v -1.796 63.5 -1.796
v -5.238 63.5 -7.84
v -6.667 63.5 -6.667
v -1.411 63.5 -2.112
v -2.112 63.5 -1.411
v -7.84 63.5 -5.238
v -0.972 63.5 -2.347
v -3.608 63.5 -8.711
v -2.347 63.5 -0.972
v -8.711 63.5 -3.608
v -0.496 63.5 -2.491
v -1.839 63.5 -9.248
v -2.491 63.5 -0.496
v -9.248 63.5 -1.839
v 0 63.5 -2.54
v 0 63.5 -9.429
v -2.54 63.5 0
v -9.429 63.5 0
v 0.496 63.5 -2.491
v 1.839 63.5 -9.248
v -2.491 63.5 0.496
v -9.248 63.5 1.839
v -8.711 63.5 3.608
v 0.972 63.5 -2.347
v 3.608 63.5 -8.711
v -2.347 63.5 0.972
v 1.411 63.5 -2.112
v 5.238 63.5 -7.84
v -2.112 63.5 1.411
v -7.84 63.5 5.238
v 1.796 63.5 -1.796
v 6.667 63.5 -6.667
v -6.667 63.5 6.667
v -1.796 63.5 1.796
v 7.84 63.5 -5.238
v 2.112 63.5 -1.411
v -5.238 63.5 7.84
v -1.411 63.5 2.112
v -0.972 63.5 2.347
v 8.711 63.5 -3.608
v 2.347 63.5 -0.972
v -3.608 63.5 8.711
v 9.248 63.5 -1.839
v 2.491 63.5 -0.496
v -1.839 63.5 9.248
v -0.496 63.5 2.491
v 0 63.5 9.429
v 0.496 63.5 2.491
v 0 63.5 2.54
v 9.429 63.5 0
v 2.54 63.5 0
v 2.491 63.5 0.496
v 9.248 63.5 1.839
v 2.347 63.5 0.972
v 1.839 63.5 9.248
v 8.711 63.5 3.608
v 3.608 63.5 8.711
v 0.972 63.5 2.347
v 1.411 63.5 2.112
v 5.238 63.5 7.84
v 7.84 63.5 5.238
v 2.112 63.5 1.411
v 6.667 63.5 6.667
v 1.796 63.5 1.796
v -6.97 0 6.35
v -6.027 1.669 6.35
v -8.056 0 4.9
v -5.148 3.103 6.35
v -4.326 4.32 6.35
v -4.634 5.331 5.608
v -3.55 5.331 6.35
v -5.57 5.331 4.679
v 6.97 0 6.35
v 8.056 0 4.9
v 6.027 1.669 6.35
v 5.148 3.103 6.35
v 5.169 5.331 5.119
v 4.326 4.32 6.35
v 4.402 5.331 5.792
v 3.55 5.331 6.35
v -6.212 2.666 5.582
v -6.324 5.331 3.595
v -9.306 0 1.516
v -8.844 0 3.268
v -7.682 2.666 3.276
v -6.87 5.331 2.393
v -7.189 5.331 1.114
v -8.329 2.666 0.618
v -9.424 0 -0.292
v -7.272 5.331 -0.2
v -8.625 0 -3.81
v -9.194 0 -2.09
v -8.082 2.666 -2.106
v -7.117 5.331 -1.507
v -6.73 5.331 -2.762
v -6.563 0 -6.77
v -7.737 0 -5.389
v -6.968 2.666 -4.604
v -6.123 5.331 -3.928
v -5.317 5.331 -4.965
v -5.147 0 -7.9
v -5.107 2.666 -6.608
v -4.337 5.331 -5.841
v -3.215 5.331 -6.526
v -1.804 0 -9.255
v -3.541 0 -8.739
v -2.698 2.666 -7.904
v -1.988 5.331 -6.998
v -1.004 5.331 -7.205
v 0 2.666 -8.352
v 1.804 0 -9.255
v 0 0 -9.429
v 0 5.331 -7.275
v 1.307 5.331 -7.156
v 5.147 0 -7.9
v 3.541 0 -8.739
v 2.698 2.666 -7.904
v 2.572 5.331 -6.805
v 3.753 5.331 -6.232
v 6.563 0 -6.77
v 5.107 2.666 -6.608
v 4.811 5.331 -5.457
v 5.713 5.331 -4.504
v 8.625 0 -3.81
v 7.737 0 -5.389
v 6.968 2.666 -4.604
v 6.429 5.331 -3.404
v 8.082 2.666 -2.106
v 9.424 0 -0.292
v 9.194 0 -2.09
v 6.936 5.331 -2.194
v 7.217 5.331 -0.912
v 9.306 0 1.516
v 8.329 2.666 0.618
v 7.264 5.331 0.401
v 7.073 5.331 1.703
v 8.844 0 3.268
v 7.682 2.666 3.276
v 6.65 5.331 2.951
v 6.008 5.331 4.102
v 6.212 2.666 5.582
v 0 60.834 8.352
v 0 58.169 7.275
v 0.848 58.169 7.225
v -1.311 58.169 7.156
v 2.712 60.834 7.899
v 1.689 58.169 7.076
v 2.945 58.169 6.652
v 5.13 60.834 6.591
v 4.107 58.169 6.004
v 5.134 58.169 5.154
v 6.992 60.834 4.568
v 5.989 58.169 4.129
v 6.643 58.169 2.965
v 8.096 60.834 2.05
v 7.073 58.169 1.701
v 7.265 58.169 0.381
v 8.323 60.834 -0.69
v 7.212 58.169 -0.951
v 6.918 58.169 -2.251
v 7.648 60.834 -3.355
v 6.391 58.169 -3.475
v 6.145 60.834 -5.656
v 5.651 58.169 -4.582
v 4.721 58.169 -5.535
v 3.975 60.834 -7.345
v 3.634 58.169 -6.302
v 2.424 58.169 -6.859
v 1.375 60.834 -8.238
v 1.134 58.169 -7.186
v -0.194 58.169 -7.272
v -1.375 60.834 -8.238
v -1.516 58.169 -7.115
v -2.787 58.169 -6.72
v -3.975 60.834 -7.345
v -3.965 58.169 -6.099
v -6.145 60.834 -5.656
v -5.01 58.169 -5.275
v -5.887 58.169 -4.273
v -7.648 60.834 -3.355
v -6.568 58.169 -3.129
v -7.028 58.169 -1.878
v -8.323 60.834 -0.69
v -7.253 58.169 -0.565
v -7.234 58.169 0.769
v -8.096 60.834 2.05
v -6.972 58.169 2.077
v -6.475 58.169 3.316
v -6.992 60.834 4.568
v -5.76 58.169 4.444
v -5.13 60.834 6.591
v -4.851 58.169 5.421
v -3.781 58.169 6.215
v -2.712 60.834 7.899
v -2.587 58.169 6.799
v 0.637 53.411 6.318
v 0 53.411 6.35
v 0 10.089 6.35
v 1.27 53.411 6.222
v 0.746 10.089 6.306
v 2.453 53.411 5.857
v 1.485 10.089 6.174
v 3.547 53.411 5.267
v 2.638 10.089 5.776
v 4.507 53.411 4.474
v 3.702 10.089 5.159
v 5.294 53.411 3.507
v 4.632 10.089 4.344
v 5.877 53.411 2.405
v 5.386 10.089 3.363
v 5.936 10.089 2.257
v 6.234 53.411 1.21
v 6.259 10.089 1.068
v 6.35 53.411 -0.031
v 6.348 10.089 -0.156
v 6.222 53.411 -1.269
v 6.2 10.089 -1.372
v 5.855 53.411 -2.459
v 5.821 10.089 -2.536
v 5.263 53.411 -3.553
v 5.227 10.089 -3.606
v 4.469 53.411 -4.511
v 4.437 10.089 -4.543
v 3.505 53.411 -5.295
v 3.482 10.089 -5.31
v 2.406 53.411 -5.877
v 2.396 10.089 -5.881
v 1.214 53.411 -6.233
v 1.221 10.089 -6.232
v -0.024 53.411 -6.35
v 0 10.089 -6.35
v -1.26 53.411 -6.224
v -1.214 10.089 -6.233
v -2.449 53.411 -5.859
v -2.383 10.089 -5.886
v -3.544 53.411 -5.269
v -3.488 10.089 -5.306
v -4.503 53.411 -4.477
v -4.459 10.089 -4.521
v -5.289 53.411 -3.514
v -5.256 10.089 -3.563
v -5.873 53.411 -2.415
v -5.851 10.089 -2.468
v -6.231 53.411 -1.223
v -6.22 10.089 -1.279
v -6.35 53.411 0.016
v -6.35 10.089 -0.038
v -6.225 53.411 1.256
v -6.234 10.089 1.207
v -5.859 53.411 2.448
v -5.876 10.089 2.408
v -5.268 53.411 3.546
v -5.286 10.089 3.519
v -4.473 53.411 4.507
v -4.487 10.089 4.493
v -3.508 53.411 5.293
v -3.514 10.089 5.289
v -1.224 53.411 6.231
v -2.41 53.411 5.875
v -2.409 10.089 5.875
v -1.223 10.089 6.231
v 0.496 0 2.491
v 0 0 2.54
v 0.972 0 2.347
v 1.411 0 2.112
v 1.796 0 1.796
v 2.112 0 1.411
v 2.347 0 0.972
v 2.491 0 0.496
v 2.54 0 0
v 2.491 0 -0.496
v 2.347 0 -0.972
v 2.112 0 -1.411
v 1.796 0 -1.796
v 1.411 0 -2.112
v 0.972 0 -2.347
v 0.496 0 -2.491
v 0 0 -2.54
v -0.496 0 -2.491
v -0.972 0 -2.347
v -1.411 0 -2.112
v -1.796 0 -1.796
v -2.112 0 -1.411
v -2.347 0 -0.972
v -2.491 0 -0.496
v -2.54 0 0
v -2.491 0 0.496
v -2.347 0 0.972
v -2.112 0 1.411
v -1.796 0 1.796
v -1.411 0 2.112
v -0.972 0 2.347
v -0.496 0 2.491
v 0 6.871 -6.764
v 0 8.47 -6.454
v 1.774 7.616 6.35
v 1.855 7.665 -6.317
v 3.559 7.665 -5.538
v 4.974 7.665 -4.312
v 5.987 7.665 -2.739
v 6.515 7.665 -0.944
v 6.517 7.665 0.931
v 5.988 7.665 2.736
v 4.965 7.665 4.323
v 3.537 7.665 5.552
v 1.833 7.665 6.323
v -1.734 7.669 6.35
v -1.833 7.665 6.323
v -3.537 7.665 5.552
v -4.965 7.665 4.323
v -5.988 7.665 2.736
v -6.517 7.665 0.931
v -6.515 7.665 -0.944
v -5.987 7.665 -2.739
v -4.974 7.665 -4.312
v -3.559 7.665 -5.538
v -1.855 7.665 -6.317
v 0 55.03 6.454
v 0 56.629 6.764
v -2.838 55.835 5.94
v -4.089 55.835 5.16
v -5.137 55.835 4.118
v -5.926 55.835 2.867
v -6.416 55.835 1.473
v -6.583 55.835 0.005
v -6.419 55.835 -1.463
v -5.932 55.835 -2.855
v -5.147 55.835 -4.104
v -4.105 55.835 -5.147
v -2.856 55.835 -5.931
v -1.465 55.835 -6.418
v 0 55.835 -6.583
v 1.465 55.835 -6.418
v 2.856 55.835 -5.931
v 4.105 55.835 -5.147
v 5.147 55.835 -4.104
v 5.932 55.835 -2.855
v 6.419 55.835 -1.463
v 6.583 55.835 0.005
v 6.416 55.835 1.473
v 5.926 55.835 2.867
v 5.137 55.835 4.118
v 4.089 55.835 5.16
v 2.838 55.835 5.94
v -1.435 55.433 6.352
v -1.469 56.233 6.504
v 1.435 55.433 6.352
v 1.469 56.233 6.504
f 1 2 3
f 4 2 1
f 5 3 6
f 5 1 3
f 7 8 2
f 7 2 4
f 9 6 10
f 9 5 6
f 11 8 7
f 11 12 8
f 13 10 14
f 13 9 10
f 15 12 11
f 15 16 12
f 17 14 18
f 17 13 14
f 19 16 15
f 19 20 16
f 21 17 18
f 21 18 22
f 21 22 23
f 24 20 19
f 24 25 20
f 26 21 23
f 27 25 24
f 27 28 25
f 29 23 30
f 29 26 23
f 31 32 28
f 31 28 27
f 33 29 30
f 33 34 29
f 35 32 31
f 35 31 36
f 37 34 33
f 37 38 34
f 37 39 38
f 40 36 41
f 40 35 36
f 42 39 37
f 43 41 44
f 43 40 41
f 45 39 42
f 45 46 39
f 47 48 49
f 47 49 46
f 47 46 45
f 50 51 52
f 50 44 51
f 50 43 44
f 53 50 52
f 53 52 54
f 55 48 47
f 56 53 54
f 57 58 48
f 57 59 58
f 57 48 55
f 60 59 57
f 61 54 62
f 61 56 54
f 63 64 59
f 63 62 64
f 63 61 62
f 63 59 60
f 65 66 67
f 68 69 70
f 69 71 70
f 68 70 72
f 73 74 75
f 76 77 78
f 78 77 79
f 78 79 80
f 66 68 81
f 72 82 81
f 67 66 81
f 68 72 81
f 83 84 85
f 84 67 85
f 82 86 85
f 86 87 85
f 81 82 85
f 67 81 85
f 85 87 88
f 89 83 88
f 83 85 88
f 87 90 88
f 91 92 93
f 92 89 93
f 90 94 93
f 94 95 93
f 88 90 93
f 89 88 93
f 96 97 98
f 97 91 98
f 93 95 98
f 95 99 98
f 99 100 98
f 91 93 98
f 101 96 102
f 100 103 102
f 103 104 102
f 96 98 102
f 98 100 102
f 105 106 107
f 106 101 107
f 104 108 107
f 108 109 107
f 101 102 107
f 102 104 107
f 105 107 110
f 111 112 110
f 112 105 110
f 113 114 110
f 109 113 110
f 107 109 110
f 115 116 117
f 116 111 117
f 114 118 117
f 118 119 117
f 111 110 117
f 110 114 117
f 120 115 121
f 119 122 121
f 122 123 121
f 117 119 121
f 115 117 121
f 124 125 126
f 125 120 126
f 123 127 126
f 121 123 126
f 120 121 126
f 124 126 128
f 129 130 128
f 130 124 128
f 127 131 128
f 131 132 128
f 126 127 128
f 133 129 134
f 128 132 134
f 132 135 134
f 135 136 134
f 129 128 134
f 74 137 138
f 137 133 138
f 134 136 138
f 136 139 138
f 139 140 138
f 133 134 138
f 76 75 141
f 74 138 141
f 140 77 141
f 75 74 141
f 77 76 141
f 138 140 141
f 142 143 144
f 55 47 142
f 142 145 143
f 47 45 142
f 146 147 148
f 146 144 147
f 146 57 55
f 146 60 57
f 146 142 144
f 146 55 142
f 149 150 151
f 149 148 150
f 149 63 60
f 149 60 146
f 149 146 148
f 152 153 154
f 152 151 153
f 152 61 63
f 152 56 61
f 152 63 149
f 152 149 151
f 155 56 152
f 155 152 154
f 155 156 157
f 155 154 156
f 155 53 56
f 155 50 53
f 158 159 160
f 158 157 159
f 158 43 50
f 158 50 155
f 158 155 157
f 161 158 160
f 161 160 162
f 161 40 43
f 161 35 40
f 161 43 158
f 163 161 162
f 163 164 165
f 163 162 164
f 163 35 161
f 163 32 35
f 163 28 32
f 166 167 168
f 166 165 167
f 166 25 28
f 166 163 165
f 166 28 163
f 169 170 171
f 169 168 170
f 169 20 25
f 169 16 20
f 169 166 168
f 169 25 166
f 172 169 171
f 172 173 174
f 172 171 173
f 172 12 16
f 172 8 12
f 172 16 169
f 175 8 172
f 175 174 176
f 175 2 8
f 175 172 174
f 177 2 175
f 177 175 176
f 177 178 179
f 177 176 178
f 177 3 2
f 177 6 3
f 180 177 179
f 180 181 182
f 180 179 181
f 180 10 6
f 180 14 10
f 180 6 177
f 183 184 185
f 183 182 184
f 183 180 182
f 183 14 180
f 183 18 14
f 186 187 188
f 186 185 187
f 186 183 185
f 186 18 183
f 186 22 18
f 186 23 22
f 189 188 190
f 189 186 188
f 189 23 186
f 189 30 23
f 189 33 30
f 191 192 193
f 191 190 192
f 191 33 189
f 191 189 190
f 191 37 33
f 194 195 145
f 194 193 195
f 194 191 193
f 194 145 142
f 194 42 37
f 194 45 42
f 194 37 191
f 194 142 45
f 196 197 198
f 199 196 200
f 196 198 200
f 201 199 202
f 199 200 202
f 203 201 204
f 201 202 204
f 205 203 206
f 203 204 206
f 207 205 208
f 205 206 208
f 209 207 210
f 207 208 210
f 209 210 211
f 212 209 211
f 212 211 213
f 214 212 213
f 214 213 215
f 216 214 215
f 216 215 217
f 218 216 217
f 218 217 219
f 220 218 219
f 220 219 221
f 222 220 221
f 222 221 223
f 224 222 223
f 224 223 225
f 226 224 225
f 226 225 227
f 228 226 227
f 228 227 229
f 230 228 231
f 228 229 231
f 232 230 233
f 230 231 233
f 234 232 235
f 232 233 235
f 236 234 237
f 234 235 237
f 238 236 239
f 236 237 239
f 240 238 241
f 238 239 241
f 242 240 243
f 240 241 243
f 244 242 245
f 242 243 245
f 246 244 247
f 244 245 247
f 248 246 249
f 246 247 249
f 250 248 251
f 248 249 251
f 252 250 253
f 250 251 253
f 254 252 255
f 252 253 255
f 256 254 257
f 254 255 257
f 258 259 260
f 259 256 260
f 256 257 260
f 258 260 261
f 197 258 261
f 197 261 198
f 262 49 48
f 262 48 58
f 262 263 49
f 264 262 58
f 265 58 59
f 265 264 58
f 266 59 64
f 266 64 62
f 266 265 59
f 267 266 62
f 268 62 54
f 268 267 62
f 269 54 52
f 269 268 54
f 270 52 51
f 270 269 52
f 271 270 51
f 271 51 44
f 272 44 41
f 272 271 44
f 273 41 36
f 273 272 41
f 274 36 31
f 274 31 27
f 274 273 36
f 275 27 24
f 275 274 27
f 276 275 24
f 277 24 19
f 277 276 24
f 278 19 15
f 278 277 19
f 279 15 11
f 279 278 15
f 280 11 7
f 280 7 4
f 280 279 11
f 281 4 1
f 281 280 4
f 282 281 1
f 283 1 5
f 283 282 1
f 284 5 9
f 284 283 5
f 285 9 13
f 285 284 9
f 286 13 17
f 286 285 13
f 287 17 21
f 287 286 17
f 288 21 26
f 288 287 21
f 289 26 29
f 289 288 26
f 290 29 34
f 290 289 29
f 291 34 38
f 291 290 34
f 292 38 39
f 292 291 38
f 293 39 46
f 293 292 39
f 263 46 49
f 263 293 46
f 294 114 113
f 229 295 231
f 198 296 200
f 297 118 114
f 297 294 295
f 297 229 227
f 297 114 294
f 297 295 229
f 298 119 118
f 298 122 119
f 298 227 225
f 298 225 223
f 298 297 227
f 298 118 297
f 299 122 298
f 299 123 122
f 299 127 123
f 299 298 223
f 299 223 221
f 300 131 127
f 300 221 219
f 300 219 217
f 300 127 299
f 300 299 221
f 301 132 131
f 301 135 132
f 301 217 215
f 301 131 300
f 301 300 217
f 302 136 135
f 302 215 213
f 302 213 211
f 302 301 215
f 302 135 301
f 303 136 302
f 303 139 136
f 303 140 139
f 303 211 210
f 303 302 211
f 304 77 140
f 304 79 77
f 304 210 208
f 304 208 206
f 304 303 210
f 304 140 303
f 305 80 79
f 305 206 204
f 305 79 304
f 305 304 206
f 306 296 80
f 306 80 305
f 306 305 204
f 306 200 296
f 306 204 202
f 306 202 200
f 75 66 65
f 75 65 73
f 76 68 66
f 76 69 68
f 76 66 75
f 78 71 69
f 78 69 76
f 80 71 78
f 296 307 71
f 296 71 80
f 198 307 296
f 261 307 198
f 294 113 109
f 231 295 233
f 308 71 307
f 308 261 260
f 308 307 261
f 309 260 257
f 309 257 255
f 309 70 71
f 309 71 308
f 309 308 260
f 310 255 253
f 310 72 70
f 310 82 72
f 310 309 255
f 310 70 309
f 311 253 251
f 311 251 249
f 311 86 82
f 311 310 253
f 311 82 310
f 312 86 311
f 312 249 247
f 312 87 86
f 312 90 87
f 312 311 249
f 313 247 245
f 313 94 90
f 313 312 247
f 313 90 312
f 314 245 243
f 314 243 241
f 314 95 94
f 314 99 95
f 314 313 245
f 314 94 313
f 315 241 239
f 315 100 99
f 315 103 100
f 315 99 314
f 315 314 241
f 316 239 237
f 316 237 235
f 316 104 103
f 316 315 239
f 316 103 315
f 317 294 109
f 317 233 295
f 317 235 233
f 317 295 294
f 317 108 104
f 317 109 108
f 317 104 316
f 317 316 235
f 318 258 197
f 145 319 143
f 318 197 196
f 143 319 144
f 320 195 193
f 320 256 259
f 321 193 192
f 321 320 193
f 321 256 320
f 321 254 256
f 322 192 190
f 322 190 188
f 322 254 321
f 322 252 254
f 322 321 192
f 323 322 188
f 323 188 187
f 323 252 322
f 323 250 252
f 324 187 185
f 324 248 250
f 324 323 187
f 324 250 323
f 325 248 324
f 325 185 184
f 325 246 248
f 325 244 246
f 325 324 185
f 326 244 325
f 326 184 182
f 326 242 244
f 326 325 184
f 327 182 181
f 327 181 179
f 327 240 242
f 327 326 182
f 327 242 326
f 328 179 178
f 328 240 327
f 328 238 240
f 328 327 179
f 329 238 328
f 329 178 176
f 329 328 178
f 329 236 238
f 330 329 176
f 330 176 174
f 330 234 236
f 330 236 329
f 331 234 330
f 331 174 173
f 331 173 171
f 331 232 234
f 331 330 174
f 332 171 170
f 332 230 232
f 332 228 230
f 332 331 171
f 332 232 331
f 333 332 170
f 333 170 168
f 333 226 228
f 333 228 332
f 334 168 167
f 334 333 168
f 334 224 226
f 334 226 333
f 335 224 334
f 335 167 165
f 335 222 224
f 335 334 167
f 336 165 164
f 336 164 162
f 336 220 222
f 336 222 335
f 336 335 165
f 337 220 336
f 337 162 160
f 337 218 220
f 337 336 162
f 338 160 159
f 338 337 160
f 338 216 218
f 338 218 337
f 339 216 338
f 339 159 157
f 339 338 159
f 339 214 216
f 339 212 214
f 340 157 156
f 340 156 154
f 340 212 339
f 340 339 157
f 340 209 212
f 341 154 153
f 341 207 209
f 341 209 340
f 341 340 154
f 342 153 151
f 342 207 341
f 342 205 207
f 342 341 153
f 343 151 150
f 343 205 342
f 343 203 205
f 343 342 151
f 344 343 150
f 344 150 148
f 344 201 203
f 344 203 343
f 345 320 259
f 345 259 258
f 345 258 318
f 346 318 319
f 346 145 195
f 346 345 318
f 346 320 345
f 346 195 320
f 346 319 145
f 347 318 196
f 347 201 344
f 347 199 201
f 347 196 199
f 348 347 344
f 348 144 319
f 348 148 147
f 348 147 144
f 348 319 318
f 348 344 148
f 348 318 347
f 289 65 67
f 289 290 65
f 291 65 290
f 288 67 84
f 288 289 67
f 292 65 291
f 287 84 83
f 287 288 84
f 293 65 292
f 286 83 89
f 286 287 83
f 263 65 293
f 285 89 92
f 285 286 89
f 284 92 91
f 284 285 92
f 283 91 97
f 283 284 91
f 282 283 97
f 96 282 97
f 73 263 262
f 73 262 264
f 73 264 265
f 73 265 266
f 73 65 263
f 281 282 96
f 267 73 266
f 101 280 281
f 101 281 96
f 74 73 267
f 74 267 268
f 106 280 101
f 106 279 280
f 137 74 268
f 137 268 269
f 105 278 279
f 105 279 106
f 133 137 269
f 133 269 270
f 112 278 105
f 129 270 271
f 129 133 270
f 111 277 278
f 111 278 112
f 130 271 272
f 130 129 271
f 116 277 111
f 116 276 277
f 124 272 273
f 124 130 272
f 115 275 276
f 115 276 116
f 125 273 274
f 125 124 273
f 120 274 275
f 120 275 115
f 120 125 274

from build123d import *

# Parameters (mm, degrees)
SKETCH1_R           = 6.35
SKETCH1_R_2         = 2.54
BOSS_EXTRUDE1_DEPTH = 63.5
SKETCH2_R           = 9.525
SKETCH2_R_2         = 2.54
BOSS_EXTRUDE2_DEPTH = 7.62
CHAMFER1_SIZE       = 7.85840076
CHAMFER1_SIZE_2     = 3.175
FILLET1_R           = 12.7
BOSS_EXTRUDE3_START = -7.62
SKETCH3_R           = 9.525
SKETCH3_R_2         = 2.54
BOSS_EXTRUDE3_DEPTH = 7.62
CHAMFER2_SIZE       = 3.175
CHAMFER2_SIZE_2     = 7.85840076
FILLET2_R           = 12.7
CUT_EXTRUDE1_START  = 6.35
SKETCH4_W           = 29.198575266
SKETCH4_H           = 42.680388974
CUT_EXTRUDE1_DEPTH  = 59.53489827


with BuildPart() as part:
    # Sketch1 → Boss-Extrude1 (new body)
    with BuildSketch(Plane(origin=(0, 0, 0), x_dir=(1, 0, 0), z_dir=(0, 1, 0))):
        with Locations(Location((0, 0, 0), (0, 0, 270))):
            Circle(SKETCH1_R)
        with Locations(Location((0, 0, 0), (0, 0, 270))):
            Circle(SKETCH1_R_2, mode=Mode.SUBTRACT)
    extrude(amount=BOSS_EXTRUDE1_DEPTH)

    # Sketch2 → Boss-Extrude2 (add)
    with BuildSketch(Plane(origin=(0, 0, 0), x_dir=(-1, 0, 0), z_dir=(0, -1, 0))):
        with Locations(Location((0, 0, 0), (0, 0, 90))):
            Circle(SKETCH2_R)
        with Locations(Location((0, 0, 0), (0, 0, 270))):
            Circle(SKETCH2_R_2, mode=Mode.SUBTRACT)
    extrude(amount=-BOSS_EXTRUDE2_DEPTH)

    # Chamfer1
    # the kernel refuses this chamfer: 7.85840076, 3.175 mm, written as the material it takes off along each edge
    with BuildSketch(Plane(origin=(0, 7.62, 0), x_dir=(0, 0, -1), z_dir=(-1, 0, 0))) as chamfer1_piece_1:
        Polygon((9.525, CHAMFER1_SIZE), (9.525 - CHAMFER1_SIZE_2, 0), (9.525, 0), align=None)
    revolve(axis=Axis((0, 7.62, 0), (0, -1, 0)), mode=Mode.SUBTRACT)

    # Fillet1
    fillet1_edges = [part.edges().sort_by_distance(p)[0] for p in [
        (6.35, 7.62, 0),
    ]]
    fillet(fillet1_edges, radius=FILLET1_R)

    # Sketch3 → Boss-Extrude3 (add)
    with BuildSketch(Plane(origin=(0, 63.5, 0), x_dir=(1, 0, 0), z_dir=(0, 1, 0)).offset(BOSS_EXTRUDE3_START)):
        with Locations(Location((0, 0, 0), (0, 0, 270))):
            Circle(SKETCH3_R)
        with Locations(Location((0, 0, 0), (0, 0, 270))):
            Circle(SKETCH3_R_2, mode=Mode.SUBTRACT)
    extrude(amount=BOSS_EXTRUDE3_DEPTH)

    # Chamfer2
    # the kernel refuses this chamfer: 7.85840076, 3.175 mm, written as the material it takes off along each edge
    with BuildSketch(Plane(origin=(0, 55.88, 0), x_dir=(0, 0, 1), z_dir=(-1, 0, 0))) as chamfer2_piece_1_section:
        Polygon((9.525 - CHAMFER2_SIZE, 0), (9.525, CHAMFER2_SIZE_2), (9.525, 0), align=None)
    chamfer2_piece_1 = revolve(axis=Axis((0, 55.88, 0), (0, 1, 0)), mode=Mode.PRIVATE)
    chamfer2_piece_1 = chamfer2_piece_1 - Plane(origin=(0, 59.920436712, 0), x_dir=(0, 0, 1), z_dir=(0, -1, 0)) * Cylinder(6.35, 39, mode=Mode.PRIVATE)
    add(chamfer2_piece_1, mode=Mode.SUBTRACT)

    # Fillet2
    fillet2_edges = [part.edges().sort_by_distance(p)[0] for p in [
        (0, 55.88, -6.35),
    ]]
    fillet(fillet2_edges, radius=FILLET2_R)

    # Sketch4 → Cut-Extrude1 (cut, through all)
    with BuildSketch(Plane.XY.offset(CUT_EXTRUDE1_START)):
        with Locations((0, 16.627867716)):
            Rectangle(SKETCH4_W, SKETCH4_H)
    extrude(amount=CUT_EXTRUDE1_DEPTH, mode=Mode.SUBTRACT)


solid = part.part
